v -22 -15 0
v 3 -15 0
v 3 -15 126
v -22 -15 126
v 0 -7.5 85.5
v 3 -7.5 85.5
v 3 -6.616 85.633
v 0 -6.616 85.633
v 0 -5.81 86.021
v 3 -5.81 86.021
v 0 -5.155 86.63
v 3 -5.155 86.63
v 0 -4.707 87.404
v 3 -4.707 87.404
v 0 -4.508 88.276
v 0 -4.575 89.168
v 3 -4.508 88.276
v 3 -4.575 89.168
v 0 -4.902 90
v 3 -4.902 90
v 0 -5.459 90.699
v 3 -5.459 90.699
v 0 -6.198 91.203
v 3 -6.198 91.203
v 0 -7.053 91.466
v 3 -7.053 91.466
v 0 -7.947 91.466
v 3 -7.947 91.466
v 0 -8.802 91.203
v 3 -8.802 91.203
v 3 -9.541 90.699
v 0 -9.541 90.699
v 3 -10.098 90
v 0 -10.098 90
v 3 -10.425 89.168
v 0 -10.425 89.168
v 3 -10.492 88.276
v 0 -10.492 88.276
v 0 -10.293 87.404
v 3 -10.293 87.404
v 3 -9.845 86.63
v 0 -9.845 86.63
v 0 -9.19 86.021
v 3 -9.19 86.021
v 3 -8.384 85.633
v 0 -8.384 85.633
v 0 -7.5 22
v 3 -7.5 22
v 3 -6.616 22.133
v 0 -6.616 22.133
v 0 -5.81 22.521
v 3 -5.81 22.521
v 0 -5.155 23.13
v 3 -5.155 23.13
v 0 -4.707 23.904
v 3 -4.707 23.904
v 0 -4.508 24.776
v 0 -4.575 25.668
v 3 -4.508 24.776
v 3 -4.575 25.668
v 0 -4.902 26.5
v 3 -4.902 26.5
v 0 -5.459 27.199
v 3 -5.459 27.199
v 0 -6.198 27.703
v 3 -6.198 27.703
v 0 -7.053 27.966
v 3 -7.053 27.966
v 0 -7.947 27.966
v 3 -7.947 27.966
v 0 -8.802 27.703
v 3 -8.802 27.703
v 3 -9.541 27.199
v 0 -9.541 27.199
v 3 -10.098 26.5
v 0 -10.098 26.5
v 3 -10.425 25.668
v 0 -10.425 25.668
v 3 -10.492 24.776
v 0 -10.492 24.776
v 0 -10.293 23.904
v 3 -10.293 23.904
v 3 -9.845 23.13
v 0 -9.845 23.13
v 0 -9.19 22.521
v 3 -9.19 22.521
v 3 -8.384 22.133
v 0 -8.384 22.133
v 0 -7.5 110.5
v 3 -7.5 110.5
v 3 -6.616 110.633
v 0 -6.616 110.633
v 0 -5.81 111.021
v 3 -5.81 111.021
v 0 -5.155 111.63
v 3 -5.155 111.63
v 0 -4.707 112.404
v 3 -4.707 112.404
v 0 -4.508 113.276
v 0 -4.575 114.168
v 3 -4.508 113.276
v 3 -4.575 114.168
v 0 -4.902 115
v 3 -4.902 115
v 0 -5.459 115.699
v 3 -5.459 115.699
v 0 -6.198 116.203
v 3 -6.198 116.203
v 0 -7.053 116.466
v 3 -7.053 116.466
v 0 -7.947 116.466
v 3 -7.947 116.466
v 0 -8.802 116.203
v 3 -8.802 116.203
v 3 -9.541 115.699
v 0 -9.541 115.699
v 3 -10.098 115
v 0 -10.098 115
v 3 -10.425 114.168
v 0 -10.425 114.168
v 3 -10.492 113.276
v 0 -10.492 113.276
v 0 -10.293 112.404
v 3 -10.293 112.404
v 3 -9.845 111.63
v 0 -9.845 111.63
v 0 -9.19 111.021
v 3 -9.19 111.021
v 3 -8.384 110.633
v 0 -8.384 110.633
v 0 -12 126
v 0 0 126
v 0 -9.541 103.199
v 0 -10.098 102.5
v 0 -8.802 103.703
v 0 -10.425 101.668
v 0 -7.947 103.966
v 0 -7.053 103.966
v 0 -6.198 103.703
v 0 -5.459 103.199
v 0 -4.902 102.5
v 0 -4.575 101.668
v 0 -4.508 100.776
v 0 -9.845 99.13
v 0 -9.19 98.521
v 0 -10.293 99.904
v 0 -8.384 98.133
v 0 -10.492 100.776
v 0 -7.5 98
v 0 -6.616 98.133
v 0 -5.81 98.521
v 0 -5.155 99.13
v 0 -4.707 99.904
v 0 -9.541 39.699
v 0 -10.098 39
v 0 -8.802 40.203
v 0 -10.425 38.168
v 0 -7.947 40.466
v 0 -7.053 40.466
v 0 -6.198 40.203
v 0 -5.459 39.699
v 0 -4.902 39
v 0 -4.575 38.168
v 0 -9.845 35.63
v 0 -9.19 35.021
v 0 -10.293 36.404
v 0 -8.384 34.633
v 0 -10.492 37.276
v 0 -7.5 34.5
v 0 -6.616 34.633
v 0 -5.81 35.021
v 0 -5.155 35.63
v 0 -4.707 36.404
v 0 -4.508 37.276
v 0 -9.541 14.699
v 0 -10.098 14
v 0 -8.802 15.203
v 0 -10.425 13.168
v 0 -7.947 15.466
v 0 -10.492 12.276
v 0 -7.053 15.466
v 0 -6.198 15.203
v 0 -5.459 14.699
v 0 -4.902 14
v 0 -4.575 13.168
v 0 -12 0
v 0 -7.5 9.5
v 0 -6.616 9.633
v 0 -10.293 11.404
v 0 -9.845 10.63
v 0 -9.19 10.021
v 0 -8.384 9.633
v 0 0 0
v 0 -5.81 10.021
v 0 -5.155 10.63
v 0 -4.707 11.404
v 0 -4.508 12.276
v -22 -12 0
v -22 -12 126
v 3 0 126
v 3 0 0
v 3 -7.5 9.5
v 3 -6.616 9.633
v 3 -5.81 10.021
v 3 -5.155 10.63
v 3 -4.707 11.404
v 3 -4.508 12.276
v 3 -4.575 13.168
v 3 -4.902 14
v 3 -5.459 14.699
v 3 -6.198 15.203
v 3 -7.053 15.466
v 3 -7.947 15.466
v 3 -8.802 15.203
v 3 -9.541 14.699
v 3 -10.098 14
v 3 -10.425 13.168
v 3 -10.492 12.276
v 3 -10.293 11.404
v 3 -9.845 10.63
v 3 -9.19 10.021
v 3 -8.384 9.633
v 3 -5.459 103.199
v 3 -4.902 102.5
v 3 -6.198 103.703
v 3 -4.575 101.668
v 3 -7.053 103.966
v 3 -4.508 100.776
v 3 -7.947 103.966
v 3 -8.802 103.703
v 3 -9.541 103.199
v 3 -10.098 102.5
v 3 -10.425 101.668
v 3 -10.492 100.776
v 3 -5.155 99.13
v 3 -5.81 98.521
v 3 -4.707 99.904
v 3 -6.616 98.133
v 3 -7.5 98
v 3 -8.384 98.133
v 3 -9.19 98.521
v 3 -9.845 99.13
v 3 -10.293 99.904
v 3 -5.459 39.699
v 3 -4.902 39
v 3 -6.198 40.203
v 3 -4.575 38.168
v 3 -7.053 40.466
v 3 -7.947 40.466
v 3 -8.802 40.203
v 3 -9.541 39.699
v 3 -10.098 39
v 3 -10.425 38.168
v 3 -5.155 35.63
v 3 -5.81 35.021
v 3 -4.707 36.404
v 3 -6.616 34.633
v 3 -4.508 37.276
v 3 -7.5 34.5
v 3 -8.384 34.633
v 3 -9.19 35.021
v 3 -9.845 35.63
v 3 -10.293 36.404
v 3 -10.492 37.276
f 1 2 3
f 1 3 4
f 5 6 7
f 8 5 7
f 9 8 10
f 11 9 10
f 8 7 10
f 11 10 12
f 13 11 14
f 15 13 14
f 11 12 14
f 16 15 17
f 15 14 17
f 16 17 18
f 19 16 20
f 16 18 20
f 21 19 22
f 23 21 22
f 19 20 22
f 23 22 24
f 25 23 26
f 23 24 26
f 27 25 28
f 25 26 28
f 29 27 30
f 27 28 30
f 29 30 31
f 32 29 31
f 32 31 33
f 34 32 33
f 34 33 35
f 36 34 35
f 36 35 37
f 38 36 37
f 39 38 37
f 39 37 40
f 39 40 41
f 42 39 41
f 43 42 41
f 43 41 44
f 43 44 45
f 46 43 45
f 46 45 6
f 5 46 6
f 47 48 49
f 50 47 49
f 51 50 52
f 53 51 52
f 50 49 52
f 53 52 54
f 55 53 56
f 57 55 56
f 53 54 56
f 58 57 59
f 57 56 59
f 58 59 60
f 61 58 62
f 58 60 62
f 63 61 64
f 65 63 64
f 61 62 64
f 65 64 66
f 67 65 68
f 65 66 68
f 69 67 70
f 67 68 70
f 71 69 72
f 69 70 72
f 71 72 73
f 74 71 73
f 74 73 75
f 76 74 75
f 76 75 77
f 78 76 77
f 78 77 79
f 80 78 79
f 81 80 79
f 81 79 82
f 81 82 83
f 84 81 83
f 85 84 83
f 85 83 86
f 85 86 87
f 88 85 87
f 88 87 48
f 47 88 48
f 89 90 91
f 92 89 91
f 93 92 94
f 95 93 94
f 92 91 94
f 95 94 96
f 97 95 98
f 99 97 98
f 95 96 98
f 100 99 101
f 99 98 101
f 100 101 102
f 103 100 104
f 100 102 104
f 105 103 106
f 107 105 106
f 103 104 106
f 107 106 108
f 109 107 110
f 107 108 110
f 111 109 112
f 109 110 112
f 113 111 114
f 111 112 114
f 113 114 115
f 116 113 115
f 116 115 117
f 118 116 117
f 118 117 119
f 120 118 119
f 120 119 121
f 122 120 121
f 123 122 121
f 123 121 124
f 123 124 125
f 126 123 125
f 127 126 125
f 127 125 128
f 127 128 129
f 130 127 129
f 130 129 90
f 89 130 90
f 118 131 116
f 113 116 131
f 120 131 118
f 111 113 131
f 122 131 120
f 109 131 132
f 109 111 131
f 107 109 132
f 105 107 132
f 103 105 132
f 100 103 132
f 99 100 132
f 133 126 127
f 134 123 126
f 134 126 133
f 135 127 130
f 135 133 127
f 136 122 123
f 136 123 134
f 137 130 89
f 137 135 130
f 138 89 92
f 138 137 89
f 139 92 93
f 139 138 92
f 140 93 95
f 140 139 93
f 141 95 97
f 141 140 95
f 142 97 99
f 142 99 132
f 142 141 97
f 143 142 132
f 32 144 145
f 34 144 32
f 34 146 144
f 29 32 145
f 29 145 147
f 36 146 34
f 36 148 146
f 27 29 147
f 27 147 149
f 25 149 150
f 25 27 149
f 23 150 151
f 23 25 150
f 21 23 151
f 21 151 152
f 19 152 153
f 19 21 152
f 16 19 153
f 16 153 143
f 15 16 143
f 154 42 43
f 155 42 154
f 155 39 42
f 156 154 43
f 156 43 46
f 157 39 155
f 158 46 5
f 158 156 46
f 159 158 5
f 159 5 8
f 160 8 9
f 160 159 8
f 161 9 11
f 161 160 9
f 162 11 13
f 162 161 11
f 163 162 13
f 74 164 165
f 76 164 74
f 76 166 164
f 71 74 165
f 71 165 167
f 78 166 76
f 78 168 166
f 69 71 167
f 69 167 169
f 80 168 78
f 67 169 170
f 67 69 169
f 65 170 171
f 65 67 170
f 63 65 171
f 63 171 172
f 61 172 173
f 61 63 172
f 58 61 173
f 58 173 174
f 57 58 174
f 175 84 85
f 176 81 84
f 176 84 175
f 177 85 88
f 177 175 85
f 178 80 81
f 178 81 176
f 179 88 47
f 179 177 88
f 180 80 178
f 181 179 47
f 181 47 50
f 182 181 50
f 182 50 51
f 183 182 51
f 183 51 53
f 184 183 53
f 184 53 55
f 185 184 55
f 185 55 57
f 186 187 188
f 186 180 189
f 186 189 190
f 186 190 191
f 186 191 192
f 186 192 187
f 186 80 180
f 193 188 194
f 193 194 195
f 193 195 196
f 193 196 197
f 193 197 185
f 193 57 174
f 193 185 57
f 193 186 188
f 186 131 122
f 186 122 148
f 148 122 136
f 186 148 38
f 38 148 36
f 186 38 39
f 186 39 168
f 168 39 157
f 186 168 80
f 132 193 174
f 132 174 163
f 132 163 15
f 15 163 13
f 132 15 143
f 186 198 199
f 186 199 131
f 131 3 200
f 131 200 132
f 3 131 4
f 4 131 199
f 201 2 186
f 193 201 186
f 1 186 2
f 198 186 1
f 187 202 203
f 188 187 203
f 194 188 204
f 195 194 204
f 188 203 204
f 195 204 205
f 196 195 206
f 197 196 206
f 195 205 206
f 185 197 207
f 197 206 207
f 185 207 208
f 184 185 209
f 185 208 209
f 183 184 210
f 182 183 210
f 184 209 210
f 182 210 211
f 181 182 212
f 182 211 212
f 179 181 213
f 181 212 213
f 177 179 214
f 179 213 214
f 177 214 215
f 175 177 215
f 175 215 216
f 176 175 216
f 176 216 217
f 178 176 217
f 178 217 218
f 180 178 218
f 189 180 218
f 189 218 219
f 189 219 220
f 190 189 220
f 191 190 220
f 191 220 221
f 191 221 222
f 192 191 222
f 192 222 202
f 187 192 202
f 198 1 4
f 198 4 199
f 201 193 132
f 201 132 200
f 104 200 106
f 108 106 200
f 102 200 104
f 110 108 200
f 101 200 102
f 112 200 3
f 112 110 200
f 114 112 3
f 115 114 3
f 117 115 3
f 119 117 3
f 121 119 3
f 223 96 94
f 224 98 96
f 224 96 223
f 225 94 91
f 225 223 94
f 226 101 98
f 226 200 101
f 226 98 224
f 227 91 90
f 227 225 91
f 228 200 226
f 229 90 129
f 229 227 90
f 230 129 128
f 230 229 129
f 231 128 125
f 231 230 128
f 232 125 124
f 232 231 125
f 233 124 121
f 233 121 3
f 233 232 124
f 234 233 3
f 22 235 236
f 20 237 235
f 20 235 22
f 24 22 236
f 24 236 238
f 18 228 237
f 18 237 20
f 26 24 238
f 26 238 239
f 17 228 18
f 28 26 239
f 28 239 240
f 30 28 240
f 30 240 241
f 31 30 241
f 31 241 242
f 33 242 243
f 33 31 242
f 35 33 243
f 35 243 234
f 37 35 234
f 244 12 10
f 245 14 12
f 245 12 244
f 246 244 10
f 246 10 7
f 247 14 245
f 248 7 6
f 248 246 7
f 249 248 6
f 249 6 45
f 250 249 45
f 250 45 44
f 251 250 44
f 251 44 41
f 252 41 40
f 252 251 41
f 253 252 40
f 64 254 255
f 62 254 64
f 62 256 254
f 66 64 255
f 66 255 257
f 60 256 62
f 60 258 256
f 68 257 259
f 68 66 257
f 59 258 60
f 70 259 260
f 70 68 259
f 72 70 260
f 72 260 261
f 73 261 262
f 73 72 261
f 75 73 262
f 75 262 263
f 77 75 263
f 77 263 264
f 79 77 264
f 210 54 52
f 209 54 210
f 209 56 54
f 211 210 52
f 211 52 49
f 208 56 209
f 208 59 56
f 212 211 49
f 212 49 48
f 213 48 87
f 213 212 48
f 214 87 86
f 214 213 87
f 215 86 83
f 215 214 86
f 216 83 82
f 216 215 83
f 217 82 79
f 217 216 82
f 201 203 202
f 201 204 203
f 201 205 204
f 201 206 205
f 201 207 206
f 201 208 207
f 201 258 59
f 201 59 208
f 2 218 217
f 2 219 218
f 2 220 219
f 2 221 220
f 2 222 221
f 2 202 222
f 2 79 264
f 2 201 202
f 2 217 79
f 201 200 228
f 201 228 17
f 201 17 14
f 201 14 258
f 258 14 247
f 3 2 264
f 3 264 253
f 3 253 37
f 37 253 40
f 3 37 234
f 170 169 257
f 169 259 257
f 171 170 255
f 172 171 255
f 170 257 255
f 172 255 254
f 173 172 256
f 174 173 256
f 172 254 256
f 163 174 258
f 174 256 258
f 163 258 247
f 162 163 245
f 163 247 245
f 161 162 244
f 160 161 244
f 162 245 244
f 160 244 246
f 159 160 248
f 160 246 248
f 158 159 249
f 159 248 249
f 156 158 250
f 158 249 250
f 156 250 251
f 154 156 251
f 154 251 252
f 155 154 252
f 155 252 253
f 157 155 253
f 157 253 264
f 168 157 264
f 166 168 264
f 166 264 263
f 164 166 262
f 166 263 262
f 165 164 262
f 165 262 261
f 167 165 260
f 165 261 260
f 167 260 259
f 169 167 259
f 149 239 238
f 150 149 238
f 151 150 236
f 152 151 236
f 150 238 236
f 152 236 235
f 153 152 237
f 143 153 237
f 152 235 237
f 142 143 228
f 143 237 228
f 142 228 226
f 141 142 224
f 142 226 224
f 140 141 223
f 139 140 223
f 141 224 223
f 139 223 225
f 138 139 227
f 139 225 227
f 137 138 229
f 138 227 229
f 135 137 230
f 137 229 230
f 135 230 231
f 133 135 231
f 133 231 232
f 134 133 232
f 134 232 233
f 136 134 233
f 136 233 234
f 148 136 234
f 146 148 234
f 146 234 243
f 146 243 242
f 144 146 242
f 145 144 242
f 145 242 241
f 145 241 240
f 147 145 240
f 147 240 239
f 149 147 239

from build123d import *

# Parameters (mm, degrees)
SALIENTE_EXTRUIR1_DEPTH = 126
CROQUIS2_R              = 3
CORTAR_EXTRUIR3_DEPTH   = 63


with BuildPart() as part:
    # Croquis1 → Saliente-Extruir1 (new body)
    with BuildSketch(Plane.XY):
        Polygon((0, 0), (3, 0), (3, -15), (-22, -15), (-22, -12), (0, -12), align=None)
    extrude(amount=SALIENTE_EXTRUIR1_DEPTH)

    # Croquis2 → Cortar-Extruir3 (cut, symmetric)
    with BuildSketch(Plane(origin=(3, 0, 0), x_dir=(0, 0, -1), z_dir=(1, 0, 0))):
        with Locations((-113.5, -7.5)):
            Circle(CROQUIS2_R)
        with Locations((-101, -7.5)):
            Circle(CROQUIS2_R)
        with Locations((-88.5, -7.5)):
            Circle(CROQUIS2_R)
        with Locations((-12.5, -7.5)):
            Circle(CROQUIS2_R)
        with Locations((-25, -7.5)):
            Circle(CROQUIS2_R)
        with Locations((-37.5, -7.5)):
            Circle(CROQUIS2_R)
    extrude(amount=CORTAR_EXTRUIR3_DEPTH, both=True, mode=Mode.SUBTRACT)


solid = part.part
